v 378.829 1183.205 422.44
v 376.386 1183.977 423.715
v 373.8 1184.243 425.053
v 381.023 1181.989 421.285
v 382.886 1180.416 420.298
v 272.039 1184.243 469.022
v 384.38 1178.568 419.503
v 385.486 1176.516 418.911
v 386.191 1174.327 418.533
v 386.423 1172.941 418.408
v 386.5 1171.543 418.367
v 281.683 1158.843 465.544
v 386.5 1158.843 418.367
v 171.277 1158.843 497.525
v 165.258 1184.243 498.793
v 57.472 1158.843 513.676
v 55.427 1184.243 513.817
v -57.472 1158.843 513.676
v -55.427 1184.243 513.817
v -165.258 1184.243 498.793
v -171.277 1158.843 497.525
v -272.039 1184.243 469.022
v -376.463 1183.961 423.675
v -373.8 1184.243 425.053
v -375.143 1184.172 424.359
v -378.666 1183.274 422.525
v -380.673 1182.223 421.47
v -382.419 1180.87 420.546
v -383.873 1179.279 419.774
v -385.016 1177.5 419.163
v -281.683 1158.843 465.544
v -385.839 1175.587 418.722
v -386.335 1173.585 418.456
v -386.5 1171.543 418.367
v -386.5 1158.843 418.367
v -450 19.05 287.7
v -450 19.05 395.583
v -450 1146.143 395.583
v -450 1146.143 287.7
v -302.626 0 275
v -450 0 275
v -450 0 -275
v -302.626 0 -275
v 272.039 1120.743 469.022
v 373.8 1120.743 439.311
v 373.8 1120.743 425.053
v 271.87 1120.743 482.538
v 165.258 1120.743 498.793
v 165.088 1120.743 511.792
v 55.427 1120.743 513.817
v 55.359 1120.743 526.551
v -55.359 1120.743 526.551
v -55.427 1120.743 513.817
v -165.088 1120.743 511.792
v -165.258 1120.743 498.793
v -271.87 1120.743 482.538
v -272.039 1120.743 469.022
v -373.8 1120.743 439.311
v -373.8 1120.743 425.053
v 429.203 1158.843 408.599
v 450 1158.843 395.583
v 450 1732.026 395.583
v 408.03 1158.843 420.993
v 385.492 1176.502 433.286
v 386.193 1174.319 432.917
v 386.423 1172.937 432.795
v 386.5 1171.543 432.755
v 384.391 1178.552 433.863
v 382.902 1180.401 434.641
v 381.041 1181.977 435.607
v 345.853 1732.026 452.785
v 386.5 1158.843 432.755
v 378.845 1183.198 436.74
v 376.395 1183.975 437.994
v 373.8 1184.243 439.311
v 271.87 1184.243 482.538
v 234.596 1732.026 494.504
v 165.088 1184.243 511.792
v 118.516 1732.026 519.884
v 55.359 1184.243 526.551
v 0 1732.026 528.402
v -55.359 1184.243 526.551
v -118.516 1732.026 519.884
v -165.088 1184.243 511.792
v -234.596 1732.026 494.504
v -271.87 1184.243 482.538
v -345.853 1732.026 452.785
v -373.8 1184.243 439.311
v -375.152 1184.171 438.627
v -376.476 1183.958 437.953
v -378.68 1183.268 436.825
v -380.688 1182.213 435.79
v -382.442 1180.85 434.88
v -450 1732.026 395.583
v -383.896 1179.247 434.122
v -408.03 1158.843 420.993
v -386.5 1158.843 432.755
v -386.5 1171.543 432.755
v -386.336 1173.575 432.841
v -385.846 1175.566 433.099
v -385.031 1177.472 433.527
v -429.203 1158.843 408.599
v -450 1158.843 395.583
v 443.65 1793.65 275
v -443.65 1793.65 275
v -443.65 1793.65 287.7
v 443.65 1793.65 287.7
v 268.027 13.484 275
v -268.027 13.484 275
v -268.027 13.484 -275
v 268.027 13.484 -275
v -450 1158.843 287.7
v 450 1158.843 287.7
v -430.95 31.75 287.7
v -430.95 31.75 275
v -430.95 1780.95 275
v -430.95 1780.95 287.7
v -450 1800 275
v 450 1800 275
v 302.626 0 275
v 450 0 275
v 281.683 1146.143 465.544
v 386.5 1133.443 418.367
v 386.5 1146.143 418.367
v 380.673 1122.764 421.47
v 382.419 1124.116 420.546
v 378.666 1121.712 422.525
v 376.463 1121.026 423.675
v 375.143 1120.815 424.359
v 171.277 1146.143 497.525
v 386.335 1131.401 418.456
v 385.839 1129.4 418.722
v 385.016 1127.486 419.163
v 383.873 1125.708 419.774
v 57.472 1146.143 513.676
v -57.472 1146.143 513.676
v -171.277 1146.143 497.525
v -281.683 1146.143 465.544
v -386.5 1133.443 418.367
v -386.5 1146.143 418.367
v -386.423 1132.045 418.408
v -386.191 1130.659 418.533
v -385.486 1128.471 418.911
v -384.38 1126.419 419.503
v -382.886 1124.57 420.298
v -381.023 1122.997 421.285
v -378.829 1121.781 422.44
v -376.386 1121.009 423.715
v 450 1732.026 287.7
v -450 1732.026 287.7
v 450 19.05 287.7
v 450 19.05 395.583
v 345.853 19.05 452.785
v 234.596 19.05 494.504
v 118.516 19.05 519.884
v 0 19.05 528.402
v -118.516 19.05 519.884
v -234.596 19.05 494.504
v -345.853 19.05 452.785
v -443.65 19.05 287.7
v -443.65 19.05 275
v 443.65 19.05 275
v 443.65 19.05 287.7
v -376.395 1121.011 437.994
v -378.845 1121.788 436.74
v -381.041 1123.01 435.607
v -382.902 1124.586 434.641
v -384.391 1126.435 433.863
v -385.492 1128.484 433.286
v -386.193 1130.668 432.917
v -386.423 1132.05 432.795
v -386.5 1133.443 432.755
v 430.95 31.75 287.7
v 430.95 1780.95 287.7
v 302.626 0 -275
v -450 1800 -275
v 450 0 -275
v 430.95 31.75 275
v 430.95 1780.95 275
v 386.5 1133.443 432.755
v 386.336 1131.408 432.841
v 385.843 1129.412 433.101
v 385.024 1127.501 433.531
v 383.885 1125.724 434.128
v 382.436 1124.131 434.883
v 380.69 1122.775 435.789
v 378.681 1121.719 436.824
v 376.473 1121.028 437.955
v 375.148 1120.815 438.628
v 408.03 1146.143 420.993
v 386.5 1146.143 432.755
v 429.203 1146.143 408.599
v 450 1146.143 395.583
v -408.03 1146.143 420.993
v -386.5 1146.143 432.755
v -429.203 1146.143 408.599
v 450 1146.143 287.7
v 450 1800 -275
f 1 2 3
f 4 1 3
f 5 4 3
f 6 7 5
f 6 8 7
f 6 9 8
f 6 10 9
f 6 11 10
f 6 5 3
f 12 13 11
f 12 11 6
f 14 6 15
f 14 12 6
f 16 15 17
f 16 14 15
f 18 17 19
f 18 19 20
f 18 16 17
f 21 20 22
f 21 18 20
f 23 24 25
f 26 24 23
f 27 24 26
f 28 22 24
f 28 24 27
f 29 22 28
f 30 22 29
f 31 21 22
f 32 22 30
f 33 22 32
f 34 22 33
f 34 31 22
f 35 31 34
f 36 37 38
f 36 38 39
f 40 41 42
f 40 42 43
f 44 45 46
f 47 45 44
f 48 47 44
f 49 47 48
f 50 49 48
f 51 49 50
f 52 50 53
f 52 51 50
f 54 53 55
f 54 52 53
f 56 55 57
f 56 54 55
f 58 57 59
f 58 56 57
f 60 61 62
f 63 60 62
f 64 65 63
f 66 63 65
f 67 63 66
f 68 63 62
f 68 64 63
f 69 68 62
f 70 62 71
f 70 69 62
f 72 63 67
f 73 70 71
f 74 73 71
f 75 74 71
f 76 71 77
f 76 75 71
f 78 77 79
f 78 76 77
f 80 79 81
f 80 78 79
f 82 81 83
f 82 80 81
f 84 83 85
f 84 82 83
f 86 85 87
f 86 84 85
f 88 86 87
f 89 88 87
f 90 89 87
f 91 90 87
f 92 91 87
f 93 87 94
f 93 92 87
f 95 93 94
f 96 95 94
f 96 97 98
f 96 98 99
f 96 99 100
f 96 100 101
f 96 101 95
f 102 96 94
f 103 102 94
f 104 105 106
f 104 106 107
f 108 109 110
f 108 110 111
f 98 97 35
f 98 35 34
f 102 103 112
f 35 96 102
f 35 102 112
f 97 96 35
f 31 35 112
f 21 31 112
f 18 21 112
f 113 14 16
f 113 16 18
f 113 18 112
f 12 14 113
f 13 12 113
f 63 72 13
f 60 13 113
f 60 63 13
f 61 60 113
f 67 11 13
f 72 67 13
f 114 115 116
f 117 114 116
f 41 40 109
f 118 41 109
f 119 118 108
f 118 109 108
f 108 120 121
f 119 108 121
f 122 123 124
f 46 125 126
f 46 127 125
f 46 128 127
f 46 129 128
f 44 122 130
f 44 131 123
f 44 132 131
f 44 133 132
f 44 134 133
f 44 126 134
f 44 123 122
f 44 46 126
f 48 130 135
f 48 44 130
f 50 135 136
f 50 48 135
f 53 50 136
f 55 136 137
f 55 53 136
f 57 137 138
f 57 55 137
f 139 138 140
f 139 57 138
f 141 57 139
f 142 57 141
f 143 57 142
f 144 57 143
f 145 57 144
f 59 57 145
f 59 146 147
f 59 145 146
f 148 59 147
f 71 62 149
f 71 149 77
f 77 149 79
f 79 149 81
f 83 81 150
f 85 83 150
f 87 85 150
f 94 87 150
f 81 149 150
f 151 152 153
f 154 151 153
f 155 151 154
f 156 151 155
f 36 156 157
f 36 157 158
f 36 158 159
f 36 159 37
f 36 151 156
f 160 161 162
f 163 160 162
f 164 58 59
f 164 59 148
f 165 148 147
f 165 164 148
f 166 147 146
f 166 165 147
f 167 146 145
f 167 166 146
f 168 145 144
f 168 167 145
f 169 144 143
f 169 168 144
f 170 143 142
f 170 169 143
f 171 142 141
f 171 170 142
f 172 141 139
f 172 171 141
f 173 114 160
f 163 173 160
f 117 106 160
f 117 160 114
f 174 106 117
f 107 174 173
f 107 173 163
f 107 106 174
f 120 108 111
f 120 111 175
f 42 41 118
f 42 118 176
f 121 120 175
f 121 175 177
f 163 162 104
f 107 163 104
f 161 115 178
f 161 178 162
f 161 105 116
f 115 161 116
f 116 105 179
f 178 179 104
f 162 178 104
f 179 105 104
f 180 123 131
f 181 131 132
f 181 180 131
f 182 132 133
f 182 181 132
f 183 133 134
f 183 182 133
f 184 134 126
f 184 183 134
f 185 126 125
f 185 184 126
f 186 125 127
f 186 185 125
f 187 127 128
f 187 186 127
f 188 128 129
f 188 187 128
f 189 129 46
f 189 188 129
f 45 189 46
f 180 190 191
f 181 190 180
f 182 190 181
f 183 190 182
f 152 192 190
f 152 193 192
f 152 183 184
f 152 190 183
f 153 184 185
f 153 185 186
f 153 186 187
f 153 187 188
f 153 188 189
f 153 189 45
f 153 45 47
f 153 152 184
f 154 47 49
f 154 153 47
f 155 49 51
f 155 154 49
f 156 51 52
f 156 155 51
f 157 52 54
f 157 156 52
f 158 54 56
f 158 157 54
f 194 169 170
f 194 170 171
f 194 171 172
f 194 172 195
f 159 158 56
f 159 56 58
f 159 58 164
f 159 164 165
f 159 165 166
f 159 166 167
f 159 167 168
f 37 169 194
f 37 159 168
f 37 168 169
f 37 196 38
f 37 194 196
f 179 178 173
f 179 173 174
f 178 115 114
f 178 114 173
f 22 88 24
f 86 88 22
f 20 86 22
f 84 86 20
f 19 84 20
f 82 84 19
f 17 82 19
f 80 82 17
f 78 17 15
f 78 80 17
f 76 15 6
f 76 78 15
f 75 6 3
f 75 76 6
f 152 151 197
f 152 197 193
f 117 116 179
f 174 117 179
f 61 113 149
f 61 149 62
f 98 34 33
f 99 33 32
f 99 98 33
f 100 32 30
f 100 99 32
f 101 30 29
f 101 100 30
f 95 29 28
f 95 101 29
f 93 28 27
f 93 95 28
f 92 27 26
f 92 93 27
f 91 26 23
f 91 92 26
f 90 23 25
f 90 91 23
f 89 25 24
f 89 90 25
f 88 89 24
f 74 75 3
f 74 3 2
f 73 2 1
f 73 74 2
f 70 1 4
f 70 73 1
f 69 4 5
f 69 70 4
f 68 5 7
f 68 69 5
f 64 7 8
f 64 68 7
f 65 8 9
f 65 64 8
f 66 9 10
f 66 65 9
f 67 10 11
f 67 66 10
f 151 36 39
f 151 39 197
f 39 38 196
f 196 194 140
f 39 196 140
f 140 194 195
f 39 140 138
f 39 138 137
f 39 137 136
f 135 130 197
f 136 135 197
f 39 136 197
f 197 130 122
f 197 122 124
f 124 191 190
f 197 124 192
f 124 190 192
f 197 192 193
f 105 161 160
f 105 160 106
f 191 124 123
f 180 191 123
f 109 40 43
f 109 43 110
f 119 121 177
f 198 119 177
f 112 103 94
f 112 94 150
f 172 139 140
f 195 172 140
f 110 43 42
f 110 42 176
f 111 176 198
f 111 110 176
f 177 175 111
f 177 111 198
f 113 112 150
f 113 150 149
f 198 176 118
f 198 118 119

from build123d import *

# Parameters (mm, degrees)
SKETCH1_W               = 900
SKETCH1_H               = 550
BOSS_EXTRUDE1_DEPTH     = 1800
BOSS_EXTRUDE2_START     = 19.05
BOSS_EXTRUDE2_DEPTH     = 1712.976
SKETCH3_W               = 900
SKETCH3_H               = 12.7
CUT_EXTRUDE1_DEPTH      = 1712.976
CUT_EXTRUDE2_REACH      = 2023.869
CUT_EXTRUDE2_END_RADIUS = 816.026540559
SKETCH5_W               = 887.3
SKETCH5_H               = 1774.6
SKETCH5_W_2             = 861.9
SKETCH5_H_2             = 1749.2
EXTRUDE_THIN1_DEPTH     = 12.7
CUT_EXTRUDE3_DEPTH      = 1936.20024806


with BuildPart() as part:
    # Sketch1 → Boss-Extrude1 (new body)
    with BuildSketch(Plane(origin=(0, 0, 0), x_dir=(1, 0, 0), z_dir=(0, 1, 0))):
        Rectangle(SKETCH1_W, SKETCH1_H)
    extrude(amount=BOSS_EXTRUDE1_DEPTH)

    # Sketch6 → Cut-Extrude3 (cut, through all)
    with BuildSketch(Plane.XY.offset(275)):
        Polygon((-302.626047731, 0), (-268.027399007, 13.483618078), (268.027399007, 13.483618078), (302.626047731, 0), align=None)
    extrude(amount=-CUT_EXTRUDE3_DEPTH, mode=Mode.SUBTRACT)


with BuildPart() as body_2:
    # Sketch2 → Boss-Extrude2 (new body)
    with BuildSketch(Plane(origin=(0, 0, 0), x_dir=(1, 0, 0), z_dir=(0, 1, 0)).offset(BOSS_EXTRUDE2_START)):
        with BuildLine():
            Line((-450, -287.7), (450, -287.7))
            Line((450, -287.7), (450, -395.583268728))
            ThreePointArc((450, -395.583268728), (0, -528.402), (-450, -395.583268728))
            Line((-450, -395.583268728), (-450, -287.7))
        make_face()
    extrude(amount=BOSS_EXTRUDE2_DEPTH)

    # Sketch3 → Cut-Extrude1 (cut)
    with BuildSketch(Plane.XY.offset(528.402)):
        with Locations((0, 1152.493299562)):
            Rectangle(SKETCH3_W, SKETCH3_H)
    extrude(amount=-CUT_EXTRUDE1_DEPTH, mode=Mode.SUBTRACT)


with BuildPart() as cut_extrude1_piece_1:
    # of the separate pieces the step leaves, piece 1, a body of its own (cut_extrude1_pieces)
    add(body_2.part.solids().sort_by_distance((-450, 19.05, 395.583268728))[0])


with BuildPart() as cut_extrude1_piece_2:
    # of the separate pieces the step leaves, piece 2, a body of its own (cut_extrude1_pieces)
    add(body_2.part.solids().sort_by_distance((-450, 1158.843299562, 395.583268728))[0])


with BuildPart() as cut_extrude2_tool:
    # Cut-Extrude2: up to this cylinder (the profile starts outside it)
    cut_extrude2_end = Plane(origin=(0, 1152.4933, -300.324540559), z_dir=(0, -1, 0)) * Cylinder(CUT_EXTRUDE2_END_RADIUS, 5680.791081118, mode=Mode.PRIVATE)
    # Sketch4 → Cut-Extrude2 (new, up to the surface)
    with BuildSketch(Plane.XY.offset(528.402), mode=Mode.PRIVATE) as cut_extrude2_sk1:
        with BuildLine():
            Line((-373.8, 1184.243299562), (373.8, 1184.243299562))
            ThreePointArc((373.8, 1184.243299562), (382.780256121, 1180.523555683), (386.5, 1171.543299562))
            Line((386.5, 1171.543299562), (386.5, 1133.443299562))
            ThreePointArc((386.5, 1133.443299562), (382.780256121, 1124.463043441), (373.8, 1120.743299562))
            Line((373.8, 1120.743299562), (-373.8, 1120.743299562))
            ThreePointArc((-373.8, 1120.743299562), (-382.780256121, 1124.463043441), (-386.5, 1133.443299562))
            Line((-386.5, 1133.443299562), (-386.5, 1171.543299562))
            ThreePointArc((-386.5, 1171.543299562), (-382.780256121, 1180.523555683), (-373.8, 1184.243299562))
        make_face()
    cut_extrude2_tool1 = extrude(cut_extrude2_sk1.sketch, amount=-CUT_EXTRUDE2_REACH, mode=Mode.PRIVATE) - cut_extrude2_end
    add(cut_extrude2_tool1.solids().sort_by_distance((0, 1152.4933, 528.402))[0])


with BuildPart() as cut_extrude1_piece_1_1:
    add(cut_extrude1_piece_1.part)

    # Cut-Extrude2: cut by cut_extrude2_tool
    add(cut_extrude2_tool.part, mode=Mode.SUBTRACT)


with BuildPart() as cut_extrude1_piece_2_1:
    add(cut_extrude1_piece_2.part)

    # Cut-Extrude2: cut by cut_extrude2_tool
    add(cut_extrude2_tool.part, mode=Mode.SUBTRACT)


with BuildPart() as body_4:
    # Sketch5 → Extrude-Thin1 (new body)
    with BuildSketch(Plane.XY.offset(275)):
        with Locations((0, 906.35)):
            Rectangle(SKETCH5_W, SKETCH5_H)
        with Locations((0, 906.35)):
            Rectangle(SKETCH5_W_2, SKETCH5_H_2, mode=Mode.SUBTRACT)
    extrude(amount=EXTRUDE_THIN1_DEPTH)


solid = Compound([part.part, cut_extrude1_piece_1_1.part, cut_extrude1_piece_2_1.part, body_4.part])
